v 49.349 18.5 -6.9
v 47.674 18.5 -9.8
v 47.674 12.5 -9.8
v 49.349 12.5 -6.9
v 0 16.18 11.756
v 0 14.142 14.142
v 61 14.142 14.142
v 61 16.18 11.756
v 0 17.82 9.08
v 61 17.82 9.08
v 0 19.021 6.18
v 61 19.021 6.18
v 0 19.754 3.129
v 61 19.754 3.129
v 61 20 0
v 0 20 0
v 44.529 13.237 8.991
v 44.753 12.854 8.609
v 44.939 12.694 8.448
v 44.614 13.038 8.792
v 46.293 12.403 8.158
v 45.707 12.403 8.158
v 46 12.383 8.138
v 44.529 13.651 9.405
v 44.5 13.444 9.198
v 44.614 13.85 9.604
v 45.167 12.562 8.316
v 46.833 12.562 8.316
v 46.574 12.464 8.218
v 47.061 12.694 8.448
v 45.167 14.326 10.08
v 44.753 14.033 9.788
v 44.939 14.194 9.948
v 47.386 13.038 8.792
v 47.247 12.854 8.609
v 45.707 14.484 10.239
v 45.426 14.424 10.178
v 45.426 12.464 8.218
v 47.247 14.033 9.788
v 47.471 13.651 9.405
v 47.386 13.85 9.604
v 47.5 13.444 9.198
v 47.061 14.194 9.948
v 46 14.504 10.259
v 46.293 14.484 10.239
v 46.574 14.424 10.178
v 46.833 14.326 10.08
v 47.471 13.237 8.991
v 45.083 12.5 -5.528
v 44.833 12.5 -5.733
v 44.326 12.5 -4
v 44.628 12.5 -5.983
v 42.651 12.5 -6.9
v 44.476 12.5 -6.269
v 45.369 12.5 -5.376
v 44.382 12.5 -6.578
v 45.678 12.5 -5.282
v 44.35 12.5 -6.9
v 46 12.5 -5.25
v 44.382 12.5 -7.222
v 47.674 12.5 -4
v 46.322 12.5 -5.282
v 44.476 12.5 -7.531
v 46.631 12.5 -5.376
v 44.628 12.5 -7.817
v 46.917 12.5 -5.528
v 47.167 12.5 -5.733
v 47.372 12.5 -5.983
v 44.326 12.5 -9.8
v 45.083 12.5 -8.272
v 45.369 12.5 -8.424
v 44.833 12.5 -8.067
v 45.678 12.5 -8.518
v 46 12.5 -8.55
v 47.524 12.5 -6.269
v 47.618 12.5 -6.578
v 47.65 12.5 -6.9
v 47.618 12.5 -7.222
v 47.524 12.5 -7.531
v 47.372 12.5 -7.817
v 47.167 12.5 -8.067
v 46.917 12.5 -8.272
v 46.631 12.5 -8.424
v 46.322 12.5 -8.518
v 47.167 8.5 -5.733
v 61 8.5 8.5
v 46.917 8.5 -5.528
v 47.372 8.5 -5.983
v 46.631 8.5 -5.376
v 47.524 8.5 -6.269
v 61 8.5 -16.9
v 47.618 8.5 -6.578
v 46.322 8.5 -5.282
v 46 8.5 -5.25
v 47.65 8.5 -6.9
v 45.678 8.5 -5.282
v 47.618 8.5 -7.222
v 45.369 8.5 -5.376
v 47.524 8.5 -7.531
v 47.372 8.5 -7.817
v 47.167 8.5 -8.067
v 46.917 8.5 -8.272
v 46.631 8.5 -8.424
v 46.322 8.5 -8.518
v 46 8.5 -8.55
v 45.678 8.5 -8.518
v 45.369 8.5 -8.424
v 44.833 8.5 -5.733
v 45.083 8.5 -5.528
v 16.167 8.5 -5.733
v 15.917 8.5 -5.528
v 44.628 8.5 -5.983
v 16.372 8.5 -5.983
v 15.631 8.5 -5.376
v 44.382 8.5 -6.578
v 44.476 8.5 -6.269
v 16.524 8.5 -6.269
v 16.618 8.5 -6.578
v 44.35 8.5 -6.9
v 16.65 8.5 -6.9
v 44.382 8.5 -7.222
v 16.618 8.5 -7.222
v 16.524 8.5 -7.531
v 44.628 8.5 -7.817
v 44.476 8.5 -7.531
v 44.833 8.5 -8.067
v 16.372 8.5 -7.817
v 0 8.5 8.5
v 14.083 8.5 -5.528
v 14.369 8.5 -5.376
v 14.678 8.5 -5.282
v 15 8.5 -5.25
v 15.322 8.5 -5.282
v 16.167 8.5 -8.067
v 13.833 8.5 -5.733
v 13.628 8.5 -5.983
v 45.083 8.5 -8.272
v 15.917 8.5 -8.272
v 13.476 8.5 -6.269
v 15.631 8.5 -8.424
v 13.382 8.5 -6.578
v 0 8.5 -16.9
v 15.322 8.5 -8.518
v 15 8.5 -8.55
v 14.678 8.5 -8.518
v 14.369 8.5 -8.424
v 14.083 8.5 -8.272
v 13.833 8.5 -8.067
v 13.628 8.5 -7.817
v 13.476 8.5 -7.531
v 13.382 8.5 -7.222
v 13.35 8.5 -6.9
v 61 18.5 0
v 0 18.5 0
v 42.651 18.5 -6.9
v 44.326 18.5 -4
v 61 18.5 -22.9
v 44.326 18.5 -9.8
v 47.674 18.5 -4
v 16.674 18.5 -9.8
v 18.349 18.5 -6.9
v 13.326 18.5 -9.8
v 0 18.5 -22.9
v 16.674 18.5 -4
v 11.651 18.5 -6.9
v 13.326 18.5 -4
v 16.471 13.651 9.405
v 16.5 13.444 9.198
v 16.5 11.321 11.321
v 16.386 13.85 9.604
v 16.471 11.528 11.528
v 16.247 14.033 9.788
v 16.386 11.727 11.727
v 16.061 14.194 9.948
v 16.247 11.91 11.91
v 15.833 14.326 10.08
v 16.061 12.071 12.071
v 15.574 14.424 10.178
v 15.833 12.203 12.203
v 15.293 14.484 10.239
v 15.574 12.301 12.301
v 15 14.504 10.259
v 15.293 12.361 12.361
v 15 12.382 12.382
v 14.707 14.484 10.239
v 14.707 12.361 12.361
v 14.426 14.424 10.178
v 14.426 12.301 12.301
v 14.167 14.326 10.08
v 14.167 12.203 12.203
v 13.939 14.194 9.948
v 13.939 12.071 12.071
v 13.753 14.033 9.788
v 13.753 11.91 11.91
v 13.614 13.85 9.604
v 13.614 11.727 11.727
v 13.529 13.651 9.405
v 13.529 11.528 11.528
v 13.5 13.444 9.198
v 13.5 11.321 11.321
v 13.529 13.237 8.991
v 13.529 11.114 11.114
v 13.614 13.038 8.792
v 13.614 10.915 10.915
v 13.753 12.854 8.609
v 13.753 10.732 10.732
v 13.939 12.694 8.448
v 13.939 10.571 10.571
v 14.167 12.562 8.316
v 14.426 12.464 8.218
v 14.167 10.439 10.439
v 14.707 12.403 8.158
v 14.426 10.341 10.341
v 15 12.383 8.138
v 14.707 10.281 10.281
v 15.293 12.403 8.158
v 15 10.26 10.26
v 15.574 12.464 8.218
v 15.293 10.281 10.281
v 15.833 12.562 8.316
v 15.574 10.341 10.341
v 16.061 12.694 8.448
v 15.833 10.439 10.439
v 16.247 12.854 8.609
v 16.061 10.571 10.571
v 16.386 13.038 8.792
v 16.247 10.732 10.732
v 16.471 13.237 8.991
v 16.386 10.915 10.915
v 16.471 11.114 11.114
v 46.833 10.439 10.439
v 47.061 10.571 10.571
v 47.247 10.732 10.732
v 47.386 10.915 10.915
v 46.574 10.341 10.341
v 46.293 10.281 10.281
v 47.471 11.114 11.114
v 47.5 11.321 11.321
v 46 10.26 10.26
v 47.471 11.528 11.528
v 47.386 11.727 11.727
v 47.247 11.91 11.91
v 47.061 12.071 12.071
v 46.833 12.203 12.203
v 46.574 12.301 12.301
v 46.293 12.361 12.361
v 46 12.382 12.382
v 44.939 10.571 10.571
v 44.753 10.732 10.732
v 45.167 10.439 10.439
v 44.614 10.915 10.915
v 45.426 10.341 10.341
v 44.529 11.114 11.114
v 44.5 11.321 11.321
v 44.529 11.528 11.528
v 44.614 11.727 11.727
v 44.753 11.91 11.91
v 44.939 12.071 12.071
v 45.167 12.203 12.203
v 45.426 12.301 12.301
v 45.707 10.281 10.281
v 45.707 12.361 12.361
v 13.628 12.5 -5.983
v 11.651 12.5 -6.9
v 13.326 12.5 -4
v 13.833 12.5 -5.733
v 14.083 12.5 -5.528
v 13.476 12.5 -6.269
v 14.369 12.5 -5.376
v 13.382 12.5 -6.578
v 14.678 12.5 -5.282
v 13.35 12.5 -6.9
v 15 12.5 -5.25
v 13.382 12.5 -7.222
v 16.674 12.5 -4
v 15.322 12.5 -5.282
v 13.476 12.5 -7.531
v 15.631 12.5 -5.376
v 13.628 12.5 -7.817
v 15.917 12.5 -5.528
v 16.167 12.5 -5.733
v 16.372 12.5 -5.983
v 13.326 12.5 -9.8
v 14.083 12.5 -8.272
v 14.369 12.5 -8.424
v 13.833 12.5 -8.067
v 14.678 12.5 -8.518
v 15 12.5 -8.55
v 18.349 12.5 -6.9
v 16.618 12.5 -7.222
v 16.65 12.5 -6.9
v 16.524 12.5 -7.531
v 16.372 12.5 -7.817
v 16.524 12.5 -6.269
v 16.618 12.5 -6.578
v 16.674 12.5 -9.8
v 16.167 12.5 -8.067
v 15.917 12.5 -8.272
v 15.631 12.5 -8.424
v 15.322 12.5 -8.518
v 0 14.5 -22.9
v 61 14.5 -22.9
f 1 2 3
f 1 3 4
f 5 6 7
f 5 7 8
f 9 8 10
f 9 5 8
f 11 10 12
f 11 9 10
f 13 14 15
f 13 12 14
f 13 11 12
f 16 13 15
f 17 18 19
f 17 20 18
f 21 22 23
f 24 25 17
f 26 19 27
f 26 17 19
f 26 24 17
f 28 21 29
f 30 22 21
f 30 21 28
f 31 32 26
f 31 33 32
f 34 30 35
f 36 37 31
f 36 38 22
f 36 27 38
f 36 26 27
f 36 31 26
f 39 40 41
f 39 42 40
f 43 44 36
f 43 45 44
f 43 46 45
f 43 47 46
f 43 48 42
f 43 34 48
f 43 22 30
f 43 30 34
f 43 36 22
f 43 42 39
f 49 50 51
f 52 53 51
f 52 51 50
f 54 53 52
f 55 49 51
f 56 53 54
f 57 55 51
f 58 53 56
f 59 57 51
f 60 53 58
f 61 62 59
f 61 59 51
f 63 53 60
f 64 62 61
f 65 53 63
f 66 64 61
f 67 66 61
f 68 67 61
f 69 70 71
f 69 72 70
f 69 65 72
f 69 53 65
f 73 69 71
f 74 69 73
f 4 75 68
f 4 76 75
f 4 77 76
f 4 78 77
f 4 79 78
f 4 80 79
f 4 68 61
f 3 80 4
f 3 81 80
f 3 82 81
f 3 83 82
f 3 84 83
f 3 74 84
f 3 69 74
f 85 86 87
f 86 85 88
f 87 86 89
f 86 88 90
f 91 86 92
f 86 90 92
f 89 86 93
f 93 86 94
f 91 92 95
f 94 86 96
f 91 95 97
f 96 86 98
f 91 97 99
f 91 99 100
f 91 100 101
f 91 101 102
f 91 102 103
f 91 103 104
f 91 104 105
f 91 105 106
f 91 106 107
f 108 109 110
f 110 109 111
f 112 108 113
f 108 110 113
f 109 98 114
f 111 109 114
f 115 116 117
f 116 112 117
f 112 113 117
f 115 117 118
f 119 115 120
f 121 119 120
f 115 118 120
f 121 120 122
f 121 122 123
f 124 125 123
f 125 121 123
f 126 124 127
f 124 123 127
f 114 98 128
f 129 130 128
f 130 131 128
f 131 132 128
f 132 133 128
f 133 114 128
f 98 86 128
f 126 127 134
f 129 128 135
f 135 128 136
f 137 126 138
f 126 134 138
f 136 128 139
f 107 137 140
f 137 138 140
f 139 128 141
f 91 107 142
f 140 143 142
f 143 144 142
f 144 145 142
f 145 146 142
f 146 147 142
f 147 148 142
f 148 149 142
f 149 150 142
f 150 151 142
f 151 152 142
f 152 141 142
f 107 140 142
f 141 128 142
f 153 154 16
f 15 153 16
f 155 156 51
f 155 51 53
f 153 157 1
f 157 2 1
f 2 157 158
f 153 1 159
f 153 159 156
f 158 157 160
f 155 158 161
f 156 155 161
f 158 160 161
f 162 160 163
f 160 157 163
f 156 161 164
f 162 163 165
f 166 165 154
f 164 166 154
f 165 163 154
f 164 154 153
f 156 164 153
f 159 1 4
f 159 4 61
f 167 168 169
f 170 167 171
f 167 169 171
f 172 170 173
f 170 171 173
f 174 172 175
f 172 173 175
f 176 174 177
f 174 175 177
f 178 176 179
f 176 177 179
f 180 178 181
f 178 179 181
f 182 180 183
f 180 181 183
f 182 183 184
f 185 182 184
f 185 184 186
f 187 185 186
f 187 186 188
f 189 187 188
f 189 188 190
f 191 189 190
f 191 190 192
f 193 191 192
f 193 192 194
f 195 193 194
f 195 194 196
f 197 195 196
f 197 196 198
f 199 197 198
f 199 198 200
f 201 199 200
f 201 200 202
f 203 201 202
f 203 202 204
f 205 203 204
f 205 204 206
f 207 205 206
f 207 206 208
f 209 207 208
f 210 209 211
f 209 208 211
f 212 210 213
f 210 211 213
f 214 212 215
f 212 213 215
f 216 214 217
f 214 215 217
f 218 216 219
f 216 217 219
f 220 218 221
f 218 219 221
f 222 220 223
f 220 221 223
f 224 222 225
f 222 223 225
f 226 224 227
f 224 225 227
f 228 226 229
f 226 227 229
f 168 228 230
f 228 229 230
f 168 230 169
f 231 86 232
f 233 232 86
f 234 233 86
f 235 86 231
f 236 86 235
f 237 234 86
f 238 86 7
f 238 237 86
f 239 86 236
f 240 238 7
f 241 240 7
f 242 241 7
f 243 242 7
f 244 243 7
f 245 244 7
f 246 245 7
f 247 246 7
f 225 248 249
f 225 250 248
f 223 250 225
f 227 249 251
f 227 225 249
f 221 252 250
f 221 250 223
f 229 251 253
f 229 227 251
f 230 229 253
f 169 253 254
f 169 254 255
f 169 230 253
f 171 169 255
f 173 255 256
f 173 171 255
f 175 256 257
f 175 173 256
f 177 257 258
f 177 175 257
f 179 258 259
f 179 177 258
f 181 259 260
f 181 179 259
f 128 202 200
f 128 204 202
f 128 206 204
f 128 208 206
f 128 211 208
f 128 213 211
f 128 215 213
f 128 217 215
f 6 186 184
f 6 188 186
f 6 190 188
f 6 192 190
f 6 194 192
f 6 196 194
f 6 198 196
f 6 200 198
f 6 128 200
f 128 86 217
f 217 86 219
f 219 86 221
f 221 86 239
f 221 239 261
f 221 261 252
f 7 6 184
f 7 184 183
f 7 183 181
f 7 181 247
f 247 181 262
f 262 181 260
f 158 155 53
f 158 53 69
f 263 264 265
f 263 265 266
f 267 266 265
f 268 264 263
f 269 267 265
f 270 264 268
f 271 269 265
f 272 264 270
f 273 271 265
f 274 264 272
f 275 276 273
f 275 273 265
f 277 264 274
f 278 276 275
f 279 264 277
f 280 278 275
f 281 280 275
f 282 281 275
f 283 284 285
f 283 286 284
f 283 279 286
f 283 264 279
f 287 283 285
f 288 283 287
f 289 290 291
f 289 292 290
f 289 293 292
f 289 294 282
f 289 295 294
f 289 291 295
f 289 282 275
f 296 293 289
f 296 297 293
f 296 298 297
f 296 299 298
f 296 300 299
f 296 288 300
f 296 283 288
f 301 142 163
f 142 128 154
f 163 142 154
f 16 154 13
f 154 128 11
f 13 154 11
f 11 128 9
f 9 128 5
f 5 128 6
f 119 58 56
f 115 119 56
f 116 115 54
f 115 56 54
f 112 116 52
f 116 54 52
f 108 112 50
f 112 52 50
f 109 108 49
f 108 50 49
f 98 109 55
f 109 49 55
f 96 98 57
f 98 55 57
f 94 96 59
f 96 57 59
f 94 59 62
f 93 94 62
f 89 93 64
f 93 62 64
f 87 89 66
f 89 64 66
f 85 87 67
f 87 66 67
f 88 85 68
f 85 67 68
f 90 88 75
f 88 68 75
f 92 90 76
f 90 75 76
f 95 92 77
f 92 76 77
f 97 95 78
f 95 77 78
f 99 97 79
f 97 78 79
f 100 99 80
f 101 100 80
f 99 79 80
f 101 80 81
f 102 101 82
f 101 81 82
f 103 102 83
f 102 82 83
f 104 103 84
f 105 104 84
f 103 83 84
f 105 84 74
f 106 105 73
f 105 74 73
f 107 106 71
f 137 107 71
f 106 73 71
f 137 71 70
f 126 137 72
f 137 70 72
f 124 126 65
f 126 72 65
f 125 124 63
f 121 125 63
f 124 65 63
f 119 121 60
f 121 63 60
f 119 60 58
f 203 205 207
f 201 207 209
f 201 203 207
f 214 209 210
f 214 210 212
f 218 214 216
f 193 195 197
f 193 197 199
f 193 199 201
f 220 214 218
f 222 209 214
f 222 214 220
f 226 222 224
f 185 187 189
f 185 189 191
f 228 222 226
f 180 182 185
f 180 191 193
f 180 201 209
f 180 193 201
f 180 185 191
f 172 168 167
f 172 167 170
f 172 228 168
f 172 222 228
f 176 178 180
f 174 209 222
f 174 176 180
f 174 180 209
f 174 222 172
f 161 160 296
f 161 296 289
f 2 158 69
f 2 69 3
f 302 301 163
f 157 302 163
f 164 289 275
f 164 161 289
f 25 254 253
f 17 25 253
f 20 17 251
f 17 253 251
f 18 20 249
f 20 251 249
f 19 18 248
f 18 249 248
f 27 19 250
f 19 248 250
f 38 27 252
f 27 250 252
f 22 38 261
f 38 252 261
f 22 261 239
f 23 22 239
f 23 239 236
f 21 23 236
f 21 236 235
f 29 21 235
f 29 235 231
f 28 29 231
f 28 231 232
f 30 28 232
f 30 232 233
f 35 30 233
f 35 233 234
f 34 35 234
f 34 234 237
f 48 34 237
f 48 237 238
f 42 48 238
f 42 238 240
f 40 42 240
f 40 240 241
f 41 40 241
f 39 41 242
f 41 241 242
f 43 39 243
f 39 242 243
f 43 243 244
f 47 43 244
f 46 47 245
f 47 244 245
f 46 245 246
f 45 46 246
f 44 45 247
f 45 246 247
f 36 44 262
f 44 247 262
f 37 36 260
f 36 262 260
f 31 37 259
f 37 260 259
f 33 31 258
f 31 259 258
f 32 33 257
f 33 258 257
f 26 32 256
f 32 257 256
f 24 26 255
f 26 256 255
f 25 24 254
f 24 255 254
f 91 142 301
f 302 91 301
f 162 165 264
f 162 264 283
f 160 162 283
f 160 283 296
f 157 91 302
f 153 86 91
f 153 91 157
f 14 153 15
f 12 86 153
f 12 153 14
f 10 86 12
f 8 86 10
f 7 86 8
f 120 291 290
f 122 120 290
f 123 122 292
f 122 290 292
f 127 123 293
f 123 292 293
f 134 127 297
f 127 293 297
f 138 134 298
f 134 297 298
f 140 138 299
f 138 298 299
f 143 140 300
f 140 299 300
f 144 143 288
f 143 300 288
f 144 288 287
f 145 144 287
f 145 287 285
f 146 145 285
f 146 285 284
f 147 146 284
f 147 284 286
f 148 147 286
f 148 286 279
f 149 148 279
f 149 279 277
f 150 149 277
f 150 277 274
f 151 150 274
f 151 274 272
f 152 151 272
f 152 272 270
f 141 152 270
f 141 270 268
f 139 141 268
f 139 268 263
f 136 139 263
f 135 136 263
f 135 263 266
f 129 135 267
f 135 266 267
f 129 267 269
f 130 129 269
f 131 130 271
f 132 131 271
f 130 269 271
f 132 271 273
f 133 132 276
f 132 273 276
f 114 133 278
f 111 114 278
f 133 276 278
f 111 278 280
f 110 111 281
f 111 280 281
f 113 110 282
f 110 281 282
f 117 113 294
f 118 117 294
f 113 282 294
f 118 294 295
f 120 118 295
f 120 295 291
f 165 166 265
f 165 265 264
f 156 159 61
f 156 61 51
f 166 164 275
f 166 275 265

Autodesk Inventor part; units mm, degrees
ref_plane "YZ Plane" through (0, 0, 0) normal (1, 0, 0) x (0, 1, 0)
ref_plane "XZ Plane" through (0, 0, 0) normal (0, 1, 0) x (-1, 0, 0)
sketch "Sketch1" plane through (0, 0, 0) normal (1, 0, 0) x (0, 1, 0)
  circle A0 centre (0, 0) radius 20
  line L0 (8.5, 8.5) -> (-16.9, 8.5)
  line L1 (8.5, 8.5) -> (8.5, -16.9)
  line L2 (0, 0) -> (0, 20)
  line L3 (0, 20) -> (-60.9241, 20)
  line L4 (-60.9241, 20) -> (-60.9241, 18.5)
  line L5 (-60.9241, 18.5) -> (0, 18.5)
  line L6 (0, 18.5) -> (0, 20)
  line L7 (0, 0) -> (14.1421, 14.1421)
  line L8 (0, 0) -> (20, 0)
  line L9 (-16.9, 8.5) -> (-16.9, 18.5)
  line L10 (-16.9, 8.5) -> (-22.9, 14.5)
  line L11 (-22.9, 14.5) -> (-22.9, 18.5)
  line L12 (12.3744, 12.3744) -> (12.1502, 13.2109)
  line L13 (11.3137, 13.435) -> (9.2071, 11.3284)
  line L14 (9.4313, 10.4919) -> (10.2678, 10.2678)
  line L15 (8.5, 8.5) -> (8.5, -16.9)
  line L16 (20, 0) -> (20, -60.9241)
  line L17 (20, -60.9241) -> (18.5, -60.9241)
  line L18 (18.5, -60.9241) -> (18.5, 0)
  line L19 (8.5, -16.9) -> (18.5, -16.9)
  line L20 (8.5, -16.9) -> (14.5, -22.9)
  line L21 (14.5, -22.9) -> (18.5, -22.9)
  arc A1 (9.2071, 11.3284) -> (9.4313, 10.4919) centre (9.5607, 10.9749) ccw
  arc A2 (12.1502, 13.2109) -> (11.3137, 13.435) centre (11.6673, 13.0815) ccw
  line L22 (10.4311, 10.4311) -> (9.483, 10.6851)
  arc A3 (9.3485, 11.187) -> (9.483, 10.6851) centre (9.5607, 10.9749) ccw
  line L23 (9.3485, 11.187) -> (11.4551, 13.2936)
  arc A4 (11.957, 13.1591) -> (11.4551, 13.2936) centre (11.6673, 13.0815) ccw
  line L24 (11.957, 13.1591) -> (12.2111, 12.2111)
  point P0 (0, 8.5)
  point P1 (-17.7041, 9.3041)
  point P2 (-16.9, 10.6953)
  point P3 (10.6953, -16.9)
  point P4 (9.3041, -17.7041)
  point P5 (18.5, 0)
  dimension "d0" = 40
  dimension "d1" = 25.4
  dimension "d2" = 1.5
  dimension "d4" = 45
  dimension "d6" = 45
  dimension "d7" = 4
  dimension "d8" = 10
  dimension "d10" = 2.5
  dimension "d11" = 2.5
  dimension "d12" = 60
  dimension "d13" = 1.5
  dimension "d15" = 0.5
  dimension "d16" = 0.2
extrude "Extrusion1" add sketch "Sketch1" along normal blind 61 contours L8 L1 L7 A0 | L18 L19 A0 | A0 L19 L1 L8 L18 | L19 L18 L21 L20 A0 | A0 L20 L19
sketch "Sketch3" plane through (0, 18.5, 0) normal (0, 1, 0) x (1, 0, 0)
  line L0 (0, 22.9) -> (0, 0) projected
  line L1 (0, 0) -> (61, 0) projected
  line L2 (61, 22.9) -> (61, 0) projected
  line L3 (0, 22.9) -> (61, 22.9) projected
  line L4 (0, 16.9) -> (61, 16.9) projected
  line L5 (13.3257, 4) -> (11.6514, 6.9)
  line L6 (11.6514, 6.9) -> (13.3257, 9.8)
  line L7 (13.3257, 9.8) -> (16.6743, 9.8)
  line L8 (16.6743, 9.8) -> (18.3486, 6.9)
  line L9 (18.3486, 6.9) -> (16.6743, 4)
  line L10 (16.6743, 4) -> (13.3257, 4)
  circle A0 centre (15, 6.9) radius 1.65
  point P0 (0, 0)
  dimension "d28" = 5.8
  dimension "d29" = 10
  dimension "d30" = 15
  dimension "d31" = 3.3
extrude "Extrusion4" cut sketch "Sketch3" against normal blind 6 contours L5 L6 L7 L8 L9 L10 | A0
extrude "Extrusion5" cut sketch "Sketch3" against normal through all contours A0
sketch "Sketch4" plane through (0, 14.5, -22.9) normal (0, 0, -1) x (-1, 0, 0)
  line L0 (0, -6) -> (0, 0) projected
  line L1 (0, 0) -> (0, 4) projected
  line L2 (0, 4) -> (0, 5.5) projected
  line L3 (0, -6) -> (-61, -6) projected
  line L4 (0, 5.5) -> (-61, 5.5) projected
  line L5 (0, 5.5) -> (-4.787, -6)
  point P0 (0, -14.5)
  dimension "d36" = 112.6
ref_plane "Work Plane1" through (2.4384, 14.1421, 14.1421) normal (0, -0.7071, 0.7071) x (1, 0, 0)
sketch "Sketch5" plane through (2.4384, 14.1421, 14.1421) normal (0, -0.7071, 0.7071) x (1, 0, 0)
  circle A0 centre (12.5616, -3.9896) radius 1.5
  line L0 (-2.4384, 0) -> (-2.4384, -7.9792) projected
  line L1 (-2.4384, -7.9792) -> (58.5616, -7.9792) projected
  line L2 (58.5616, 0) -> (58.5616, -7.9792) projected
  line L3 (-2.4384, 0) -> (58.5616, 0) projected
  point P0 (-2.4384, -3.9896)
  dimension "d42" = 3
  dimension "d55" = 15
extrude "Extrusion7" cut sketch "Sketch5" against normal blind 3 contours A0
ref_plane "Work Plane2" through (30.5, 0, 0) normal (-1, 0, 0) x (0, 0, 1)
mirror "Mirror1" about plane through (30.5, 0, 0) normal (-1, 0, 0) of "Extrusion7", "Extrusion5", "Extrusion4"
properties part number "ESQUINA_REDONDEADA_R20" material "Steel, Mild, Welded"
